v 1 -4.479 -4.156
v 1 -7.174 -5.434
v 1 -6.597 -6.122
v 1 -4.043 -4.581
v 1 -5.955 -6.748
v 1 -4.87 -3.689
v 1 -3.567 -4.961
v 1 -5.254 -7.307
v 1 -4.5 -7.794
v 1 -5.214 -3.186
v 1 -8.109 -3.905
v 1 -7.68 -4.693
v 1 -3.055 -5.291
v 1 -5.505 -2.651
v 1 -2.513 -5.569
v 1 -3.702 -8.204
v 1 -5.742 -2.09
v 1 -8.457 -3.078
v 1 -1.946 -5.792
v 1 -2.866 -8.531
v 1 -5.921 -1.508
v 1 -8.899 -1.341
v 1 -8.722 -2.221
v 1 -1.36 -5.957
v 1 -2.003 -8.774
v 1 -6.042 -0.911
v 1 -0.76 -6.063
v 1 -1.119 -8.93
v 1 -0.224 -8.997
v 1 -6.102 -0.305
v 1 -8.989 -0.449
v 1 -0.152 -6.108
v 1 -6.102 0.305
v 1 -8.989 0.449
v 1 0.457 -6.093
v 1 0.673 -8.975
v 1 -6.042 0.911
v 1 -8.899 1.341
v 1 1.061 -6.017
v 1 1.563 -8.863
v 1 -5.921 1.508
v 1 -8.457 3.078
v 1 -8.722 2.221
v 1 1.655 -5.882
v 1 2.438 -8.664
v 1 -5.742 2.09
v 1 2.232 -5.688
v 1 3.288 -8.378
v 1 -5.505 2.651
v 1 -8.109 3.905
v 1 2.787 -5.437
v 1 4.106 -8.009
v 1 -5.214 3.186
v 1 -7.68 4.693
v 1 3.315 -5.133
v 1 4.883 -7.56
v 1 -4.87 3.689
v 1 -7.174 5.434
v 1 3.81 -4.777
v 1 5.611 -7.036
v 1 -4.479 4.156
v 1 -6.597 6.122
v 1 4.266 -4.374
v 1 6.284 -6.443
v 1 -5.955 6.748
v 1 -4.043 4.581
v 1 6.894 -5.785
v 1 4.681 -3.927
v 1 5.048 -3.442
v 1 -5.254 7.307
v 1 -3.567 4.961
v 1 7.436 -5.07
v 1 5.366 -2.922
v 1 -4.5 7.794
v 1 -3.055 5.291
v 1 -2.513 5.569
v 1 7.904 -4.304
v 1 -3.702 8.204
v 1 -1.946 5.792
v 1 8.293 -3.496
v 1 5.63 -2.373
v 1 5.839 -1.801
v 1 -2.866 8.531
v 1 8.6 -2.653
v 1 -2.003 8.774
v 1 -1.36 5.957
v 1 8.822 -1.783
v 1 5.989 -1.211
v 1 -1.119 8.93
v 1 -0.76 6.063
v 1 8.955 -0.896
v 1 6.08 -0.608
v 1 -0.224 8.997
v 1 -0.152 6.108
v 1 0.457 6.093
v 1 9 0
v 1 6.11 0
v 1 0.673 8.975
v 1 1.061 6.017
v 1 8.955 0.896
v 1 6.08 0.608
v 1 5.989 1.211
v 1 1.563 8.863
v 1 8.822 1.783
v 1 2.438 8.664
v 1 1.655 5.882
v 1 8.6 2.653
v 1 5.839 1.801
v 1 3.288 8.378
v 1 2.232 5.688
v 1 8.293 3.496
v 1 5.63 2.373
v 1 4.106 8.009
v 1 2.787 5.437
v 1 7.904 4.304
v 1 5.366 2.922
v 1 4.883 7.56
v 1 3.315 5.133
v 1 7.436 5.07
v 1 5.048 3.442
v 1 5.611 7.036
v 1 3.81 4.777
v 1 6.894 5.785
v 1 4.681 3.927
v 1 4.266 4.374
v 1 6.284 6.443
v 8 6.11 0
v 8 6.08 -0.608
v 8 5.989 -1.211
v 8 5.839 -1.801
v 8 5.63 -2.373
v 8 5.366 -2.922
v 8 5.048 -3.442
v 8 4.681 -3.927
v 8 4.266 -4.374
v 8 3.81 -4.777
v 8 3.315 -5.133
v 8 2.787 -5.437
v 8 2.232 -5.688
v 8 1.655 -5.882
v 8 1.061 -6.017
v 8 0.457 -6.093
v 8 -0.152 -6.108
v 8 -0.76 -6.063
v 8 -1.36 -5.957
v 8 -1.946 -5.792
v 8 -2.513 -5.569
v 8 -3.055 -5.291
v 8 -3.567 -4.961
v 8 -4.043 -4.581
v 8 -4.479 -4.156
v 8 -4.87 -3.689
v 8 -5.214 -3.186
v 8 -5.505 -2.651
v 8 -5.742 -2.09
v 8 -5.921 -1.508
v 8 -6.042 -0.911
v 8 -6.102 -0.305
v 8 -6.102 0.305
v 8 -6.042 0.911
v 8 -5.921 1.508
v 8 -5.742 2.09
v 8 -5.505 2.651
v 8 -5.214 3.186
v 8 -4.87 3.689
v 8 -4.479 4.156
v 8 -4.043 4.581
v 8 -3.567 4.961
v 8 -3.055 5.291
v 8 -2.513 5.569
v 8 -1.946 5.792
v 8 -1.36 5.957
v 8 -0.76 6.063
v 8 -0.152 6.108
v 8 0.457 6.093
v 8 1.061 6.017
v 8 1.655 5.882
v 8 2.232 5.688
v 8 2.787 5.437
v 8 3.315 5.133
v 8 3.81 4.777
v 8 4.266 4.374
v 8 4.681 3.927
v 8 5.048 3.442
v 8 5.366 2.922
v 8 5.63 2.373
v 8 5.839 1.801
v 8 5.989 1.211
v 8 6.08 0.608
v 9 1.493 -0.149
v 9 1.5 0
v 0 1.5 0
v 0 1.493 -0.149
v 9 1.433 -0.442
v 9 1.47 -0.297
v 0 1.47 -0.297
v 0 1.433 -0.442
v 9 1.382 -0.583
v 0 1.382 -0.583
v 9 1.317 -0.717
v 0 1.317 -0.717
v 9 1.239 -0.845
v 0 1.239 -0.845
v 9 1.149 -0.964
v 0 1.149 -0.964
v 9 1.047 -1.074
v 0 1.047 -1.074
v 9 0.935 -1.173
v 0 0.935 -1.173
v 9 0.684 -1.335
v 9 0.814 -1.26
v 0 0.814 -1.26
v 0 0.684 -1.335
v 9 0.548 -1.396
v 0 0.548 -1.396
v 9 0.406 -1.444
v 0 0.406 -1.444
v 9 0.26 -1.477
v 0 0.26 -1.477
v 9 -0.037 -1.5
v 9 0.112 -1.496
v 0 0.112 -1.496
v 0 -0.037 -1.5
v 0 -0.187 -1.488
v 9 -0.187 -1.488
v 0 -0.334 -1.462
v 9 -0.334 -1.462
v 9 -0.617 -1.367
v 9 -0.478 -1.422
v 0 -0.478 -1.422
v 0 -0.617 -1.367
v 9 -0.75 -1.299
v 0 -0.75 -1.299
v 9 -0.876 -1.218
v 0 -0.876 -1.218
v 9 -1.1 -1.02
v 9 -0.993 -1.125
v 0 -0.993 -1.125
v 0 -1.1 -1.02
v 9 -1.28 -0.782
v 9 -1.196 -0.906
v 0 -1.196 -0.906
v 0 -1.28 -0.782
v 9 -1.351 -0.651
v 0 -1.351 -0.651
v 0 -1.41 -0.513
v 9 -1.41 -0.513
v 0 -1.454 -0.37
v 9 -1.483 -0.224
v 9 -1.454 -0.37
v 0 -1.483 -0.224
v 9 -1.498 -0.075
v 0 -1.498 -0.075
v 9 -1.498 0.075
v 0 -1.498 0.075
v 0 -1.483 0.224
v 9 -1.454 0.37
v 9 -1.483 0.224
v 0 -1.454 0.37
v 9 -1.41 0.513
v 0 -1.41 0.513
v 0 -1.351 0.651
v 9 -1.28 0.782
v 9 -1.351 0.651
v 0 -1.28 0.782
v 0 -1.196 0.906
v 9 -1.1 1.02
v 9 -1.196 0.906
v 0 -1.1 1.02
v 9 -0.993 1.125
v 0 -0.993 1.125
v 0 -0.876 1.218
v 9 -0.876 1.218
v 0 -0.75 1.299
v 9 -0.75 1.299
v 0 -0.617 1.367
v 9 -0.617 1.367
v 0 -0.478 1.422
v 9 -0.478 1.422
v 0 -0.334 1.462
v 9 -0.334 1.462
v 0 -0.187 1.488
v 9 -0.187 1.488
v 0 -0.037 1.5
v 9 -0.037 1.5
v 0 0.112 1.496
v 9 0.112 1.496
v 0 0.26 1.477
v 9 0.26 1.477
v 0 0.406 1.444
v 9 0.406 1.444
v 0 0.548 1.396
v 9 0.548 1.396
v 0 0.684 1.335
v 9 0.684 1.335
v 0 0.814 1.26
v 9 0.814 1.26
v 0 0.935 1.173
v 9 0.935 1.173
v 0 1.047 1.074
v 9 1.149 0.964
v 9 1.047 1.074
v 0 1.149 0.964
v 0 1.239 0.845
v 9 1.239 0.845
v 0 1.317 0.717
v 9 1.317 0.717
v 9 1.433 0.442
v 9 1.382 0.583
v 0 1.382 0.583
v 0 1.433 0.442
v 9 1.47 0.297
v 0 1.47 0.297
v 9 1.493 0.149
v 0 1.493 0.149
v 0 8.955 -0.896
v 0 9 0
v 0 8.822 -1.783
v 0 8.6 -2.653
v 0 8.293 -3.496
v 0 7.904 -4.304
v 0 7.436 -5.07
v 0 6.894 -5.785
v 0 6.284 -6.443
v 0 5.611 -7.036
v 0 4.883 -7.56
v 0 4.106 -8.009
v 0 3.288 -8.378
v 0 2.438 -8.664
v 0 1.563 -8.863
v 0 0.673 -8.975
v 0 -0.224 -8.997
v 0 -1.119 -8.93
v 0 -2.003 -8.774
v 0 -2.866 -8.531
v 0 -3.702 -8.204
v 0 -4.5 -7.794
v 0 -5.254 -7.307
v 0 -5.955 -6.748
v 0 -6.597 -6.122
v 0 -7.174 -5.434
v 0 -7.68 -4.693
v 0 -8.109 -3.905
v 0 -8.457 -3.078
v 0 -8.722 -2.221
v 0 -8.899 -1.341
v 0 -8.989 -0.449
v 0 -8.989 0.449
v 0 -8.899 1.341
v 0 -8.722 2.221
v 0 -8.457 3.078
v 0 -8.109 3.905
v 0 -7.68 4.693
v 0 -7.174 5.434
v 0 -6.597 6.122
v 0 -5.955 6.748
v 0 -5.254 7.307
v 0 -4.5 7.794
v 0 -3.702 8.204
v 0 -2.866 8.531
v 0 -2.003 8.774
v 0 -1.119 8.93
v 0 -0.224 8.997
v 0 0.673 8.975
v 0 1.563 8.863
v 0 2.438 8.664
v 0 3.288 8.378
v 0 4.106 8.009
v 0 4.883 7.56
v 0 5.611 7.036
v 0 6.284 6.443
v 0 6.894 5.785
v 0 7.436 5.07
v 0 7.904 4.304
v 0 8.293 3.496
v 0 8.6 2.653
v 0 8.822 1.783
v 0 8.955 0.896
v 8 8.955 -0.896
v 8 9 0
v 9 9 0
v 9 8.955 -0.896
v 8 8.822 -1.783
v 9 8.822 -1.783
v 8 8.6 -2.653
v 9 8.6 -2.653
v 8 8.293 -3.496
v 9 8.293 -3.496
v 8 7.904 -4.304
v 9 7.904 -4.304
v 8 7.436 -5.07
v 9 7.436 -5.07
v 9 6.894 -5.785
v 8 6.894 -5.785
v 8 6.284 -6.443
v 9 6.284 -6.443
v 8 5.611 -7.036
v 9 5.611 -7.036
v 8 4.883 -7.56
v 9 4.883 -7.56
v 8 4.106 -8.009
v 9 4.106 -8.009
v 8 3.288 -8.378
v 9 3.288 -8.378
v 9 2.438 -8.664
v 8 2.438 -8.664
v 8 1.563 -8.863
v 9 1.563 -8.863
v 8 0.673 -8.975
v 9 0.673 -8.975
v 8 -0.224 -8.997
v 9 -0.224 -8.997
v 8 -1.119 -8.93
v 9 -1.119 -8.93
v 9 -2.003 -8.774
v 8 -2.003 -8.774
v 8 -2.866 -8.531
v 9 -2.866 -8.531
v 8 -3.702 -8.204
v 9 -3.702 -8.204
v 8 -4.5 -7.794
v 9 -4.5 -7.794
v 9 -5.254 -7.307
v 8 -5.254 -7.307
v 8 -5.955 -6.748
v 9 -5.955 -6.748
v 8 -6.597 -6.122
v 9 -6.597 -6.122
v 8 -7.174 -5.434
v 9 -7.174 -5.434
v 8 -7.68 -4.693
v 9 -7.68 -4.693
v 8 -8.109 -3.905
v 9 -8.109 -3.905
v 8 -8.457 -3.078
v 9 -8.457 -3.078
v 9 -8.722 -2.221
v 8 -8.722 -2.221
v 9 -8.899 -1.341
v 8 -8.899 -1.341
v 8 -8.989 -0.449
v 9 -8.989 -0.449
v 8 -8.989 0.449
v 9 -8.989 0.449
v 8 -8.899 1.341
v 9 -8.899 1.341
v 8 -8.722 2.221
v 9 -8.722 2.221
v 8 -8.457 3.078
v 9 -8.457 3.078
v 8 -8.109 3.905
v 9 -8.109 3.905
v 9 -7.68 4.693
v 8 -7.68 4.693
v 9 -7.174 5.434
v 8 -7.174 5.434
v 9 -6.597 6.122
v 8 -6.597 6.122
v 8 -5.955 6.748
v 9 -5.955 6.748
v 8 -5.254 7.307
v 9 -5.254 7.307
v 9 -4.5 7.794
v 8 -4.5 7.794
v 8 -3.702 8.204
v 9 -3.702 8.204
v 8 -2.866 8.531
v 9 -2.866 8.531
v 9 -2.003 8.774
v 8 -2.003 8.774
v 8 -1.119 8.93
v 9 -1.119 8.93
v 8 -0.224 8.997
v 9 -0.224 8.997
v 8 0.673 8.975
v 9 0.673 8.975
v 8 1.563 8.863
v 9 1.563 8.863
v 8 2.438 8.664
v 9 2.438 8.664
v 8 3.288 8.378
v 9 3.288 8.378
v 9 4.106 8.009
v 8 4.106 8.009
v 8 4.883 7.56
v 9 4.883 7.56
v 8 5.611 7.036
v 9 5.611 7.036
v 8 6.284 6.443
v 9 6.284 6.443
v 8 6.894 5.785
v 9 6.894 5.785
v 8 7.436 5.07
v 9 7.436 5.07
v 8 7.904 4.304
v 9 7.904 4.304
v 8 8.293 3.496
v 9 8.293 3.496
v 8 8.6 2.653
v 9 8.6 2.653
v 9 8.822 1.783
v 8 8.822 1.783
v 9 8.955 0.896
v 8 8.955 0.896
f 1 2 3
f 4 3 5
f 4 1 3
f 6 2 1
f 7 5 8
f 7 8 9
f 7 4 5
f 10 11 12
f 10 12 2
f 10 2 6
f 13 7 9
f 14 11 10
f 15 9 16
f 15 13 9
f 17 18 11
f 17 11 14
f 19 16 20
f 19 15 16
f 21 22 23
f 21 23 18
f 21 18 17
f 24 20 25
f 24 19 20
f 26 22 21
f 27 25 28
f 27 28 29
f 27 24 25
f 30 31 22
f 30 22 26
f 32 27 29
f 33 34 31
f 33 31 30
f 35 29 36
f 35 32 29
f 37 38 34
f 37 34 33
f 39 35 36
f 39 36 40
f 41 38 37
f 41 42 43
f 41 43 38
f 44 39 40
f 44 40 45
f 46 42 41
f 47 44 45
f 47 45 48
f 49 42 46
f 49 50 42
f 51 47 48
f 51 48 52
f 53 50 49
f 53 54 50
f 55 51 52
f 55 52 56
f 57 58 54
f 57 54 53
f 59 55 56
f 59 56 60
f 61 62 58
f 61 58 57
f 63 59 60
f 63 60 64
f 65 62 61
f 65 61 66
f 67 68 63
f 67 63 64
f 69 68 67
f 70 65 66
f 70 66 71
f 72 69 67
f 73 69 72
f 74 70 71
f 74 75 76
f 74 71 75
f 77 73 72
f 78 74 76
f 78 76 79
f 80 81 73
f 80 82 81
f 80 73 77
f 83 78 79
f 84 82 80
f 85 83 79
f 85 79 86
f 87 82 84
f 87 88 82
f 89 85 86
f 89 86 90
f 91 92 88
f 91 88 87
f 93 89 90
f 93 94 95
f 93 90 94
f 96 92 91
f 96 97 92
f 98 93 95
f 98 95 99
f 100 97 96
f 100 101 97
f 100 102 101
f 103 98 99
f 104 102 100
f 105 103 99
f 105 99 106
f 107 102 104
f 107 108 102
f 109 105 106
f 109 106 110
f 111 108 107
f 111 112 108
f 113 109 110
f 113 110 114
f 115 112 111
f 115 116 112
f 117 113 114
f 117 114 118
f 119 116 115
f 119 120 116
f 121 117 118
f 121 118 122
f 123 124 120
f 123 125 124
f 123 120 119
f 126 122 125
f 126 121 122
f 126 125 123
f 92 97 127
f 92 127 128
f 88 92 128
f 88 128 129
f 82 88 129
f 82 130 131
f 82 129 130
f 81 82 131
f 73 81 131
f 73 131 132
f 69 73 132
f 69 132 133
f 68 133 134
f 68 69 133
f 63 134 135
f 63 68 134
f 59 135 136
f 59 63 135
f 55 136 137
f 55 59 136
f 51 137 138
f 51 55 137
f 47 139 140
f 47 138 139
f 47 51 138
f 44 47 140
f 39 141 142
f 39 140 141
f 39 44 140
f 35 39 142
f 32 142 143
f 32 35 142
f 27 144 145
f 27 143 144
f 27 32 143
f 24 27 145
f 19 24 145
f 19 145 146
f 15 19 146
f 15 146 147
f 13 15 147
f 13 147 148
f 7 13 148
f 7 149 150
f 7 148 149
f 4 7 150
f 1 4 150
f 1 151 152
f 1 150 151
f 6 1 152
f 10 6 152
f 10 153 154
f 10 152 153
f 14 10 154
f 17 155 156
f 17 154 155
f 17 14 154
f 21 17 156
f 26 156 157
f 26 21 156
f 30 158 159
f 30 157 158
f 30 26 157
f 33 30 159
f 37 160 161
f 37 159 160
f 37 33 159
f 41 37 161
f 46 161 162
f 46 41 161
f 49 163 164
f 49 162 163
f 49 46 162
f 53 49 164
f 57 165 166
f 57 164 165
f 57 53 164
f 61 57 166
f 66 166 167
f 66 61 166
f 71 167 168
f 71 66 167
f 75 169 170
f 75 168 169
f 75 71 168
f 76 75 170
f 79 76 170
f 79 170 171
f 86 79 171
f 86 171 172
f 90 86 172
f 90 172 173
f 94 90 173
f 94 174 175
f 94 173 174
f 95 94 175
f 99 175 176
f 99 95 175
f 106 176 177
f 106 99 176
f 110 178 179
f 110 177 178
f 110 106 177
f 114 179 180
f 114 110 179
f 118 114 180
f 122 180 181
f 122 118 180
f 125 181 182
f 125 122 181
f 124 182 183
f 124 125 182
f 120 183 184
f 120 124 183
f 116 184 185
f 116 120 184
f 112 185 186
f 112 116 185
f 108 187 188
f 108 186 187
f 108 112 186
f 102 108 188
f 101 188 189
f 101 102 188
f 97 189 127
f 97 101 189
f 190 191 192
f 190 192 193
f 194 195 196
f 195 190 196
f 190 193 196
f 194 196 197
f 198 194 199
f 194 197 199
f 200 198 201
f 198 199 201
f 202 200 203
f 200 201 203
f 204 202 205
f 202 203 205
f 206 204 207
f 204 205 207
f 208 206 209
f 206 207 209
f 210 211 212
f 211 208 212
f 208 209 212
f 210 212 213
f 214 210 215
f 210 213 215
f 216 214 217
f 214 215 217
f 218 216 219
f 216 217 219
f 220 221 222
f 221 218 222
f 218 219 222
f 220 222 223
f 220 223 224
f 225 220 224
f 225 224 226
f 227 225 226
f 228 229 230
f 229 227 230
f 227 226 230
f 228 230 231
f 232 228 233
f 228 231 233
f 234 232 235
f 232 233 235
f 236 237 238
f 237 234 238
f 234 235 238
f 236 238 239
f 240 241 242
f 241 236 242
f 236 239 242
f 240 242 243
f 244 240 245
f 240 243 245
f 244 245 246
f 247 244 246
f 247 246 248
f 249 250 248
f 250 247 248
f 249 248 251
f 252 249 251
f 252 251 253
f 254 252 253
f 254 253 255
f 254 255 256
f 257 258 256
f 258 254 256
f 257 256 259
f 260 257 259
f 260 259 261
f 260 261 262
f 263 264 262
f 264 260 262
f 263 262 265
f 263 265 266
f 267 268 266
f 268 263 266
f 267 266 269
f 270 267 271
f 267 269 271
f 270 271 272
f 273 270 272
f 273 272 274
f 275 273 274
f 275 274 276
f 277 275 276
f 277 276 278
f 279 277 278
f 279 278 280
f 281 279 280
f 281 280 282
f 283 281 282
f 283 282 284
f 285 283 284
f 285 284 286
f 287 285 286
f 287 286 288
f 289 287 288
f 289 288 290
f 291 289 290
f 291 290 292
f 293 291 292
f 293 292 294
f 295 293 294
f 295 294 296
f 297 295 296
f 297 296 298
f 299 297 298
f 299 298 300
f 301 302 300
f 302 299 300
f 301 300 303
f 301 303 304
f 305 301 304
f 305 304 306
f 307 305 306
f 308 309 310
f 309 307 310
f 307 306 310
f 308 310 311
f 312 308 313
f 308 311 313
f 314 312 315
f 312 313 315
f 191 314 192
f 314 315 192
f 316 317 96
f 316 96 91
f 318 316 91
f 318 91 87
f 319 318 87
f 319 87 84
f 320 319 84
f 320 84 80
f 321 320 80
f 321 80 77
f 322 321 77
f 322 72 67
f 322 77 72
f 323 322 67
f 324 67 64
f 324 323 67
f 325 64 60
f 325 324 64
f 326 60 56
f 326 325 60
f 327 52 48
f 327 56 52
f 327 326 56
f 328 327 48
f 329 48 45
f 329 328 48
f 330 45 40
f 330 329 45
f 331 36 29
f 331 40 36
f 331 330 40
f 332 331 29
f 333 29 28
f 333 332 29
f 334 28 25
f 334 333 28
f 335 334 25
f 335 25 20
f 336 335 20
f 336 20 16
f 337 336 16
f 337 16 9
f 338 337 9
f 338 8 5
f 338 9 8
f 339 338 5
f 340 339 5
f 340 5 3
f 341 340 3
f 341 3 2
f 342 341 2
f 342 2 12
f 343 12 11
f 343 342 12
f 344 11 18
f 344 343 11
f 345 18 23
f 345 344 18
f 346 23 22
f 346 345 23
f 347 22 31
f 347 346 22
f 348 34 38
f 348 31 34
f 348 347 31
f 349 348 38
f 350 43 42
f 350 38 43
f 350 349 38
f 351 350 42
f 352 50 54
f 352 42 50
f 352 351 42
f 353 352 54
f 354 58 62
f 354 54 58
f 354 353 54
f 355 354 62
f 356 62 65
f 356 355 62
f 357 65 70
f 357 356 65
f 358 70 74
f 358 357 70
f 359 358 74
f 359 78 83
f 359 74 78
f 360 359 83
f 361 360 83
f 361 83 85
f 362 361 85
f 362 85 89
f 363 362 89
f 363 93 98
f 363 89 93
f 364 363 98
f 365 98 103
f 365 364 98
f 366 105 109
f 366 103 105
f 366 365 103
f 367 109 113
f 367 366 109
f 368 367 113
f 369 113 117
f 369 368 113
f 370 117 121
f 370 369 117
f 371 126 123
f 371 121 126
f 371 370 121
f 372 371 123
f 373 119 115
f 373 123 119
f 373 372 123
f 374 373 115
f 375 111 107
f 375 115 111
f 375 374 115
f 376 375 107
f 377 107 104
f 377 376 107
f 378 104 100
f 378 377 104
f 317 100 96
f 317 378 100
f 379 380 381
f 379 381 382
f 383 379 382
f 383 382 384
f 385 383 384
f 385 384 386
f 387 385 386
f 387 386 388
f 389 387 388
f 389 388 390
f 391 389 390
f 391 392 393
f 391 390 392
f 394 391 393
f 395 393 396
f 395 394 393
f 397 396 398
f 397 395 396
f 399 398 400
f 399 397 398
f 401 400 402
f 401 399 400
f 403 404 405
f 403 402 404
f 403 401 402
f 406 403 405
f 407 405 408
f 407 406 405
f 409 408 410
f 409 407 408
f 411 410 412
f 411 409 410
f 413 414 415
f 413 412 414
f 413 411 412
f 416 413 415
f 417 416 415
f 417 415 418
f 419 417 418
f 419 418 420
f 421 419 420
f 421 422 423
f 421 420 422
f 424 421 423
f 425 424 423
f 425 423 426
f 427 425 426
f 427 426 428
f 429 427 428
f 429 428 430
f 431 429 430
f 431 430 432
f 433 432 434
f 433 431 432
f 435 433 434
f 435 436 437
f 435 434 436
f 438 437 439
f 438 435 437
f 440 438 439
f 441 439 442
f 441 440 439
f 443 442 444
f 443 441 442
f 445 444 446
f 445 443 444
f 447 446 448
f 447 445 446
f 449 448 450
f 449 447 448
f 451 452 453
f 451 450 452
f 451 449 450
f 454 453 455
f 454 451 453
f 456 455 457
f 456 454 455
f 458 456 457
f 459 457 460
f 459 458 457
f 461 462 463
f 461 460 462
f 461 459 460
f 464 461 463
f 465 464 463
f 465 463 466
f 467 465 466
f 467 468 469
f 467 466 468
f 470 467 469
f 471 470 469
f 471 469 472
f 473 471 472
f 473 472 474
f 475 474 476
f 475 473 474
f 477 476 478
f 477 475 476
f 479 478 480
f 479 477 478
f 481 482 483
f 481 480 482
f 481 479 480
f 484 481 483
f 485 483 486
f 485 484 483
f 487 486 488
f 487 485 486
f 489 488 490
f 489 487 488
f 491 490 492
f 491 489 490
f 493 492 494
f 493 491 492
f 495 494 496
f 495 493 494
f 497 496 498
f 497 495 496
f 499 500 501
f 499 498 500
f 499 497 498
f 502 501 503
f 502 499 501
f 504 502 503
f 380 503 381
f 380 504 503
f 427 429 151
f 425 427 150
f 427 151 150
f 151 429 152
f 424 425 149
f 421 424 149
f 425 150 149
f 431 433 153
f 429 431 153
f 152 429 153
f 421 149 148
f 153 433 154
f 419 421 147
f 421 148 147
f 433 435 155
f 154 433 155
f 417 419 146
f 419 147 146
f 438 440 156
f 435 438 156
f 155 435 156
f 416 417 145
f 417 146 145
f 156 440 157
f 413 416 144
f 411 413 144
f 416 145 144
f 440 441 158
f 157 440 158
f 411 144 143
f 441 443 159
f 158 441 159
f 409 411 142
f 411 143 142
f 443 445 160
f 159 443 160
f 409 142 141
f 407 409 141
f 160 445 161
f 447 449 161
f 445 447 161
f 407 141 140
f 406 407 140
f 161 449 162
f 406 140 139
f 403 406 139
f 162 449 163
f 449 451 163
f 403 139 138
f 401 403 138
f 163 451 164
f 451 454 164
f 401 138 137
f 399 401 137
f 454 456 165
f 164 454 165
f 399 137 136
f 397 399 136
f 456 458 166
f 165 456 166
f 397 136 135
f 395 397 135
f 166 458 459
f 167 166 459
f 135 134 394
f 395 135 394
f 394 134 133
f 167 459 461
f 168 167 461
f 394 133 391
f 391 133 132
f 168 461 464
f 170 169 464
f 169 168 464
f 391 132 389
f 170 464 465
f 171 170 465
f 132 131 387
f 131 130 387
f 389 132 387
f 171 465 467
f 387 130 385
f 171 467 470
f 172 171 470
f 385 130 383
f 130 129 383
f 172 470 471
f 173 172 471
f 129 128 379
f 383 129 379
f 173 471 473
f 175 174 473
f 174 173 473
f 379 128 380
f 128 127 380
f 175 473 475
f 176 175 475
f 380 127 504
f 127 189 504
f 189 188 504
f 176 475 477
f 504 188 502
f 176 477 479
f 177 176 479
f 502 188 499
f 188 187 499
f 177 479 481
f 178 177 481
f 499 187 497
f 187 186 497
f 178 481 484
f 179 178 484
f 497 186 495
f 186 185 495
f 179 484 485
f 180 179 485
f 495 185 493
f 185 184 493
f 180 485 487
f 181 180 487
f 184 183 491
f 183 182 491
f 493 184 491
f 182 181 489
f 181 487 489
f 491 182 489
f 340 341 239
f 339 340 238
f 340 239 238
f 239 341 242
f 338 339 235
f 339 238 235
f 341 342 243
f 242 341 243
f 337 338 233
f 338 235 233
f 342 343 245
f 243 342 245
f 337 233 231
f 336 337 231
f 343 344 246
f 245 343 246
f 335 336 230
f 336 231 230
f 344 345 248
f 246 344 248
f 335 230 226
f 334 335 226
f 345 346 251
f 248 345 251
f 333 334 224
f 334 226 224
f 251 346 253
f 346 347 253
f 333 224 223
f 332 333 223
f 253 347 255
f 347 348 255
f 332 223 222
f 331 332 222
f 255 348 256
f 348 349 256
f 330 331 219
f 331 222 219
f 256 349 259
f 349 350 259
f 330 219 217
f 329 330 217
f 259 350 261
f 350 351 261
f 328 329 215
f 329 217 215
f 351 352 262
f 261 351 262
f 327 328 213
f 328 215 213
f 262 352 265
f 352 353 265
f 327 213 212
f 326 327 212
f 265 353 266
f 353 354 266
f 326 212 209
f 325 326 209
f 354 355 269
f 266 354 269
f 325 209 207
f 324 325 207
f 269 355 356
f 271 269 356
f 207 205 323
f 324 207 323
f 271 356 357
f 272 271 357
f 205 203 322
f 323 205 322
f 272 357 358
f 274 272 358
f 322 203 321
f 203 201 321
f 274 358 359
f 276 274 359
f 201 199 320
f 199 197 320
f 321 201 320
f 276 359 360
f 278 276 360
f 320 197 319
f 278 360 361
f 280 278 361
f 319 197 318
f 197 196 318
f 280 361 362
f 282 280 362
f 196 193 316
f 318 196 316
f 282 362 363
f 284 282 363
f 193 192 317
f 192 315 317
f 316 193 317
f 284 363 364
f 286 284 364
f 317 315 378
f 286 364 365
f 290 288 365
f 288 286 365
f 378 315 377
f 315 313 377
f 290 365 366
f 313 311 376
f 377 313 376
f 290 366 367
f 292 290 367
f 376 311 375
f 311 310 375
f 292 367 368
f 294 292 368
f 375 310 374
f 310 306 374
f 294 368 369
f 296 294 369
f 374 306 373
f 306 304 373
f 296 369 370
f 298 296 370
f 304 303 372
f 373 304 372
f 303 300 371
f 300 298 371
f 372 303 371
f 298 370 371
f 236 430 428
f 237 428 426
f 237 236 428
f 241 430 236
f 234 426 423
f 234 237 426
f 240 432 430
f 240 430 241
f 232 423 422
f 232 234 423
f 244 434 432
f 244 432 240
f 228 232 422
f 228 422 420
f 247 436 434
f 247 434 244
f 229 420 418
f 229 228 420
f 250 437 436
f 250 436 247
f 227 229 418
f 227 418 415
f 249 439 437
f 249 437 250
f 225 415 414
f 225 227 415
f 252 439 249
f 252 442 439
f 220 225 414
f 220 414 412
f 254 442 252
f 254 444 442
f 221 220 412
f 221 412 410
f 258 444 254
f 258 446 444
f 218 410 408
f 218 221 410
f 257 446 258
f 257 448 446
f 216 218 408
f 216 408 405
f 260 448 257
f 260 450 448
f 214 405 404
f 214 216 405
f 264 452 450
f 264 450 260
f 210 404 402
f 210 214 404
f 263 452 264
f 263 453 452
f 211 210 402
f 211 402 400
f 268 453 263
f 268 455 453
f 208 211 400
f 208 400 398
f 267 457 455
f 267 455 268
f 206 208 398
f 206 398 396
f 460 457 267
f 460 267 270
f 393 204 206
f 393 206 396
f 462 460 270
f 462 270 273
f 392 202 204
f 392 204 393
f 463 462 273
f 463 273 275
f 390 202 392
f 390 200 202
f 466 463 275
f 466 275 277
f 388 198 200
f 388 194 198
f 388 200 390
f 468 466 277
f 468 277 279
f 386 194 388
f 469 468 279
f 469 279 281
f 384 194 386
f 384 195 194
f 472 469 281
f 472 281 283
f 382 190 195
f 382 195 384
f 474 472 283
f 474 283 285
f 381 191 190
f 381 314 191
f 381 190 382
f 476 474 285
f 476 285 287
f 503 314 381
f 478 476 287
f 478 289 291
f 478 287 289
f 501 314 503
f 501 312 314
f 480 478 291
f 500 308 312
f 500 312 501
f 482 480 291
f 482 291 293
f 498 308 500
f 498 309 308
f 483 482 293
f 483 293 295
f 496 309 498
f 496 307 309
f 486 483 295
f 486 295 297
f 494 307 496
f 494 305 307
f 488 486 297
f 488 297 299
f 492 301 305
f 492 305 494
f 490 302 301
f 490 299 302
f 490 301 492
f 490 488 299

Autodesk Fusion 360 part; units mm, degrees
sketch "Sketch1" plane through (0, 0, 0) normal (1, 0, 0) x (0, 1, 0)
  circle A0 centre (0, 0) radius 6.11
  circle A1 centre (0, 0) radius 9
  circle A2 centre (0, 0) radius 1.5
  circle A3 centre (0, 0) radius 6.365 construction
  dimension "d1" = 3
  dimension "d2" = 12.22
  dimension "d3" = 18
  dimension "d11" = 12.73
extrude "Extrude1" add sketch "Sketch1" along normal blind 9 contours A0 | A1
extrude "Extrude2" cut sketch "Sketch1" along normal blind 7 from surface at 1 contours A1
equation "d2 = outside_dia"
equation "pitch_dia = 12.73 mm"
equation "outside_dia = 12.22 mm"
equation "d11 = pitch_dia"
